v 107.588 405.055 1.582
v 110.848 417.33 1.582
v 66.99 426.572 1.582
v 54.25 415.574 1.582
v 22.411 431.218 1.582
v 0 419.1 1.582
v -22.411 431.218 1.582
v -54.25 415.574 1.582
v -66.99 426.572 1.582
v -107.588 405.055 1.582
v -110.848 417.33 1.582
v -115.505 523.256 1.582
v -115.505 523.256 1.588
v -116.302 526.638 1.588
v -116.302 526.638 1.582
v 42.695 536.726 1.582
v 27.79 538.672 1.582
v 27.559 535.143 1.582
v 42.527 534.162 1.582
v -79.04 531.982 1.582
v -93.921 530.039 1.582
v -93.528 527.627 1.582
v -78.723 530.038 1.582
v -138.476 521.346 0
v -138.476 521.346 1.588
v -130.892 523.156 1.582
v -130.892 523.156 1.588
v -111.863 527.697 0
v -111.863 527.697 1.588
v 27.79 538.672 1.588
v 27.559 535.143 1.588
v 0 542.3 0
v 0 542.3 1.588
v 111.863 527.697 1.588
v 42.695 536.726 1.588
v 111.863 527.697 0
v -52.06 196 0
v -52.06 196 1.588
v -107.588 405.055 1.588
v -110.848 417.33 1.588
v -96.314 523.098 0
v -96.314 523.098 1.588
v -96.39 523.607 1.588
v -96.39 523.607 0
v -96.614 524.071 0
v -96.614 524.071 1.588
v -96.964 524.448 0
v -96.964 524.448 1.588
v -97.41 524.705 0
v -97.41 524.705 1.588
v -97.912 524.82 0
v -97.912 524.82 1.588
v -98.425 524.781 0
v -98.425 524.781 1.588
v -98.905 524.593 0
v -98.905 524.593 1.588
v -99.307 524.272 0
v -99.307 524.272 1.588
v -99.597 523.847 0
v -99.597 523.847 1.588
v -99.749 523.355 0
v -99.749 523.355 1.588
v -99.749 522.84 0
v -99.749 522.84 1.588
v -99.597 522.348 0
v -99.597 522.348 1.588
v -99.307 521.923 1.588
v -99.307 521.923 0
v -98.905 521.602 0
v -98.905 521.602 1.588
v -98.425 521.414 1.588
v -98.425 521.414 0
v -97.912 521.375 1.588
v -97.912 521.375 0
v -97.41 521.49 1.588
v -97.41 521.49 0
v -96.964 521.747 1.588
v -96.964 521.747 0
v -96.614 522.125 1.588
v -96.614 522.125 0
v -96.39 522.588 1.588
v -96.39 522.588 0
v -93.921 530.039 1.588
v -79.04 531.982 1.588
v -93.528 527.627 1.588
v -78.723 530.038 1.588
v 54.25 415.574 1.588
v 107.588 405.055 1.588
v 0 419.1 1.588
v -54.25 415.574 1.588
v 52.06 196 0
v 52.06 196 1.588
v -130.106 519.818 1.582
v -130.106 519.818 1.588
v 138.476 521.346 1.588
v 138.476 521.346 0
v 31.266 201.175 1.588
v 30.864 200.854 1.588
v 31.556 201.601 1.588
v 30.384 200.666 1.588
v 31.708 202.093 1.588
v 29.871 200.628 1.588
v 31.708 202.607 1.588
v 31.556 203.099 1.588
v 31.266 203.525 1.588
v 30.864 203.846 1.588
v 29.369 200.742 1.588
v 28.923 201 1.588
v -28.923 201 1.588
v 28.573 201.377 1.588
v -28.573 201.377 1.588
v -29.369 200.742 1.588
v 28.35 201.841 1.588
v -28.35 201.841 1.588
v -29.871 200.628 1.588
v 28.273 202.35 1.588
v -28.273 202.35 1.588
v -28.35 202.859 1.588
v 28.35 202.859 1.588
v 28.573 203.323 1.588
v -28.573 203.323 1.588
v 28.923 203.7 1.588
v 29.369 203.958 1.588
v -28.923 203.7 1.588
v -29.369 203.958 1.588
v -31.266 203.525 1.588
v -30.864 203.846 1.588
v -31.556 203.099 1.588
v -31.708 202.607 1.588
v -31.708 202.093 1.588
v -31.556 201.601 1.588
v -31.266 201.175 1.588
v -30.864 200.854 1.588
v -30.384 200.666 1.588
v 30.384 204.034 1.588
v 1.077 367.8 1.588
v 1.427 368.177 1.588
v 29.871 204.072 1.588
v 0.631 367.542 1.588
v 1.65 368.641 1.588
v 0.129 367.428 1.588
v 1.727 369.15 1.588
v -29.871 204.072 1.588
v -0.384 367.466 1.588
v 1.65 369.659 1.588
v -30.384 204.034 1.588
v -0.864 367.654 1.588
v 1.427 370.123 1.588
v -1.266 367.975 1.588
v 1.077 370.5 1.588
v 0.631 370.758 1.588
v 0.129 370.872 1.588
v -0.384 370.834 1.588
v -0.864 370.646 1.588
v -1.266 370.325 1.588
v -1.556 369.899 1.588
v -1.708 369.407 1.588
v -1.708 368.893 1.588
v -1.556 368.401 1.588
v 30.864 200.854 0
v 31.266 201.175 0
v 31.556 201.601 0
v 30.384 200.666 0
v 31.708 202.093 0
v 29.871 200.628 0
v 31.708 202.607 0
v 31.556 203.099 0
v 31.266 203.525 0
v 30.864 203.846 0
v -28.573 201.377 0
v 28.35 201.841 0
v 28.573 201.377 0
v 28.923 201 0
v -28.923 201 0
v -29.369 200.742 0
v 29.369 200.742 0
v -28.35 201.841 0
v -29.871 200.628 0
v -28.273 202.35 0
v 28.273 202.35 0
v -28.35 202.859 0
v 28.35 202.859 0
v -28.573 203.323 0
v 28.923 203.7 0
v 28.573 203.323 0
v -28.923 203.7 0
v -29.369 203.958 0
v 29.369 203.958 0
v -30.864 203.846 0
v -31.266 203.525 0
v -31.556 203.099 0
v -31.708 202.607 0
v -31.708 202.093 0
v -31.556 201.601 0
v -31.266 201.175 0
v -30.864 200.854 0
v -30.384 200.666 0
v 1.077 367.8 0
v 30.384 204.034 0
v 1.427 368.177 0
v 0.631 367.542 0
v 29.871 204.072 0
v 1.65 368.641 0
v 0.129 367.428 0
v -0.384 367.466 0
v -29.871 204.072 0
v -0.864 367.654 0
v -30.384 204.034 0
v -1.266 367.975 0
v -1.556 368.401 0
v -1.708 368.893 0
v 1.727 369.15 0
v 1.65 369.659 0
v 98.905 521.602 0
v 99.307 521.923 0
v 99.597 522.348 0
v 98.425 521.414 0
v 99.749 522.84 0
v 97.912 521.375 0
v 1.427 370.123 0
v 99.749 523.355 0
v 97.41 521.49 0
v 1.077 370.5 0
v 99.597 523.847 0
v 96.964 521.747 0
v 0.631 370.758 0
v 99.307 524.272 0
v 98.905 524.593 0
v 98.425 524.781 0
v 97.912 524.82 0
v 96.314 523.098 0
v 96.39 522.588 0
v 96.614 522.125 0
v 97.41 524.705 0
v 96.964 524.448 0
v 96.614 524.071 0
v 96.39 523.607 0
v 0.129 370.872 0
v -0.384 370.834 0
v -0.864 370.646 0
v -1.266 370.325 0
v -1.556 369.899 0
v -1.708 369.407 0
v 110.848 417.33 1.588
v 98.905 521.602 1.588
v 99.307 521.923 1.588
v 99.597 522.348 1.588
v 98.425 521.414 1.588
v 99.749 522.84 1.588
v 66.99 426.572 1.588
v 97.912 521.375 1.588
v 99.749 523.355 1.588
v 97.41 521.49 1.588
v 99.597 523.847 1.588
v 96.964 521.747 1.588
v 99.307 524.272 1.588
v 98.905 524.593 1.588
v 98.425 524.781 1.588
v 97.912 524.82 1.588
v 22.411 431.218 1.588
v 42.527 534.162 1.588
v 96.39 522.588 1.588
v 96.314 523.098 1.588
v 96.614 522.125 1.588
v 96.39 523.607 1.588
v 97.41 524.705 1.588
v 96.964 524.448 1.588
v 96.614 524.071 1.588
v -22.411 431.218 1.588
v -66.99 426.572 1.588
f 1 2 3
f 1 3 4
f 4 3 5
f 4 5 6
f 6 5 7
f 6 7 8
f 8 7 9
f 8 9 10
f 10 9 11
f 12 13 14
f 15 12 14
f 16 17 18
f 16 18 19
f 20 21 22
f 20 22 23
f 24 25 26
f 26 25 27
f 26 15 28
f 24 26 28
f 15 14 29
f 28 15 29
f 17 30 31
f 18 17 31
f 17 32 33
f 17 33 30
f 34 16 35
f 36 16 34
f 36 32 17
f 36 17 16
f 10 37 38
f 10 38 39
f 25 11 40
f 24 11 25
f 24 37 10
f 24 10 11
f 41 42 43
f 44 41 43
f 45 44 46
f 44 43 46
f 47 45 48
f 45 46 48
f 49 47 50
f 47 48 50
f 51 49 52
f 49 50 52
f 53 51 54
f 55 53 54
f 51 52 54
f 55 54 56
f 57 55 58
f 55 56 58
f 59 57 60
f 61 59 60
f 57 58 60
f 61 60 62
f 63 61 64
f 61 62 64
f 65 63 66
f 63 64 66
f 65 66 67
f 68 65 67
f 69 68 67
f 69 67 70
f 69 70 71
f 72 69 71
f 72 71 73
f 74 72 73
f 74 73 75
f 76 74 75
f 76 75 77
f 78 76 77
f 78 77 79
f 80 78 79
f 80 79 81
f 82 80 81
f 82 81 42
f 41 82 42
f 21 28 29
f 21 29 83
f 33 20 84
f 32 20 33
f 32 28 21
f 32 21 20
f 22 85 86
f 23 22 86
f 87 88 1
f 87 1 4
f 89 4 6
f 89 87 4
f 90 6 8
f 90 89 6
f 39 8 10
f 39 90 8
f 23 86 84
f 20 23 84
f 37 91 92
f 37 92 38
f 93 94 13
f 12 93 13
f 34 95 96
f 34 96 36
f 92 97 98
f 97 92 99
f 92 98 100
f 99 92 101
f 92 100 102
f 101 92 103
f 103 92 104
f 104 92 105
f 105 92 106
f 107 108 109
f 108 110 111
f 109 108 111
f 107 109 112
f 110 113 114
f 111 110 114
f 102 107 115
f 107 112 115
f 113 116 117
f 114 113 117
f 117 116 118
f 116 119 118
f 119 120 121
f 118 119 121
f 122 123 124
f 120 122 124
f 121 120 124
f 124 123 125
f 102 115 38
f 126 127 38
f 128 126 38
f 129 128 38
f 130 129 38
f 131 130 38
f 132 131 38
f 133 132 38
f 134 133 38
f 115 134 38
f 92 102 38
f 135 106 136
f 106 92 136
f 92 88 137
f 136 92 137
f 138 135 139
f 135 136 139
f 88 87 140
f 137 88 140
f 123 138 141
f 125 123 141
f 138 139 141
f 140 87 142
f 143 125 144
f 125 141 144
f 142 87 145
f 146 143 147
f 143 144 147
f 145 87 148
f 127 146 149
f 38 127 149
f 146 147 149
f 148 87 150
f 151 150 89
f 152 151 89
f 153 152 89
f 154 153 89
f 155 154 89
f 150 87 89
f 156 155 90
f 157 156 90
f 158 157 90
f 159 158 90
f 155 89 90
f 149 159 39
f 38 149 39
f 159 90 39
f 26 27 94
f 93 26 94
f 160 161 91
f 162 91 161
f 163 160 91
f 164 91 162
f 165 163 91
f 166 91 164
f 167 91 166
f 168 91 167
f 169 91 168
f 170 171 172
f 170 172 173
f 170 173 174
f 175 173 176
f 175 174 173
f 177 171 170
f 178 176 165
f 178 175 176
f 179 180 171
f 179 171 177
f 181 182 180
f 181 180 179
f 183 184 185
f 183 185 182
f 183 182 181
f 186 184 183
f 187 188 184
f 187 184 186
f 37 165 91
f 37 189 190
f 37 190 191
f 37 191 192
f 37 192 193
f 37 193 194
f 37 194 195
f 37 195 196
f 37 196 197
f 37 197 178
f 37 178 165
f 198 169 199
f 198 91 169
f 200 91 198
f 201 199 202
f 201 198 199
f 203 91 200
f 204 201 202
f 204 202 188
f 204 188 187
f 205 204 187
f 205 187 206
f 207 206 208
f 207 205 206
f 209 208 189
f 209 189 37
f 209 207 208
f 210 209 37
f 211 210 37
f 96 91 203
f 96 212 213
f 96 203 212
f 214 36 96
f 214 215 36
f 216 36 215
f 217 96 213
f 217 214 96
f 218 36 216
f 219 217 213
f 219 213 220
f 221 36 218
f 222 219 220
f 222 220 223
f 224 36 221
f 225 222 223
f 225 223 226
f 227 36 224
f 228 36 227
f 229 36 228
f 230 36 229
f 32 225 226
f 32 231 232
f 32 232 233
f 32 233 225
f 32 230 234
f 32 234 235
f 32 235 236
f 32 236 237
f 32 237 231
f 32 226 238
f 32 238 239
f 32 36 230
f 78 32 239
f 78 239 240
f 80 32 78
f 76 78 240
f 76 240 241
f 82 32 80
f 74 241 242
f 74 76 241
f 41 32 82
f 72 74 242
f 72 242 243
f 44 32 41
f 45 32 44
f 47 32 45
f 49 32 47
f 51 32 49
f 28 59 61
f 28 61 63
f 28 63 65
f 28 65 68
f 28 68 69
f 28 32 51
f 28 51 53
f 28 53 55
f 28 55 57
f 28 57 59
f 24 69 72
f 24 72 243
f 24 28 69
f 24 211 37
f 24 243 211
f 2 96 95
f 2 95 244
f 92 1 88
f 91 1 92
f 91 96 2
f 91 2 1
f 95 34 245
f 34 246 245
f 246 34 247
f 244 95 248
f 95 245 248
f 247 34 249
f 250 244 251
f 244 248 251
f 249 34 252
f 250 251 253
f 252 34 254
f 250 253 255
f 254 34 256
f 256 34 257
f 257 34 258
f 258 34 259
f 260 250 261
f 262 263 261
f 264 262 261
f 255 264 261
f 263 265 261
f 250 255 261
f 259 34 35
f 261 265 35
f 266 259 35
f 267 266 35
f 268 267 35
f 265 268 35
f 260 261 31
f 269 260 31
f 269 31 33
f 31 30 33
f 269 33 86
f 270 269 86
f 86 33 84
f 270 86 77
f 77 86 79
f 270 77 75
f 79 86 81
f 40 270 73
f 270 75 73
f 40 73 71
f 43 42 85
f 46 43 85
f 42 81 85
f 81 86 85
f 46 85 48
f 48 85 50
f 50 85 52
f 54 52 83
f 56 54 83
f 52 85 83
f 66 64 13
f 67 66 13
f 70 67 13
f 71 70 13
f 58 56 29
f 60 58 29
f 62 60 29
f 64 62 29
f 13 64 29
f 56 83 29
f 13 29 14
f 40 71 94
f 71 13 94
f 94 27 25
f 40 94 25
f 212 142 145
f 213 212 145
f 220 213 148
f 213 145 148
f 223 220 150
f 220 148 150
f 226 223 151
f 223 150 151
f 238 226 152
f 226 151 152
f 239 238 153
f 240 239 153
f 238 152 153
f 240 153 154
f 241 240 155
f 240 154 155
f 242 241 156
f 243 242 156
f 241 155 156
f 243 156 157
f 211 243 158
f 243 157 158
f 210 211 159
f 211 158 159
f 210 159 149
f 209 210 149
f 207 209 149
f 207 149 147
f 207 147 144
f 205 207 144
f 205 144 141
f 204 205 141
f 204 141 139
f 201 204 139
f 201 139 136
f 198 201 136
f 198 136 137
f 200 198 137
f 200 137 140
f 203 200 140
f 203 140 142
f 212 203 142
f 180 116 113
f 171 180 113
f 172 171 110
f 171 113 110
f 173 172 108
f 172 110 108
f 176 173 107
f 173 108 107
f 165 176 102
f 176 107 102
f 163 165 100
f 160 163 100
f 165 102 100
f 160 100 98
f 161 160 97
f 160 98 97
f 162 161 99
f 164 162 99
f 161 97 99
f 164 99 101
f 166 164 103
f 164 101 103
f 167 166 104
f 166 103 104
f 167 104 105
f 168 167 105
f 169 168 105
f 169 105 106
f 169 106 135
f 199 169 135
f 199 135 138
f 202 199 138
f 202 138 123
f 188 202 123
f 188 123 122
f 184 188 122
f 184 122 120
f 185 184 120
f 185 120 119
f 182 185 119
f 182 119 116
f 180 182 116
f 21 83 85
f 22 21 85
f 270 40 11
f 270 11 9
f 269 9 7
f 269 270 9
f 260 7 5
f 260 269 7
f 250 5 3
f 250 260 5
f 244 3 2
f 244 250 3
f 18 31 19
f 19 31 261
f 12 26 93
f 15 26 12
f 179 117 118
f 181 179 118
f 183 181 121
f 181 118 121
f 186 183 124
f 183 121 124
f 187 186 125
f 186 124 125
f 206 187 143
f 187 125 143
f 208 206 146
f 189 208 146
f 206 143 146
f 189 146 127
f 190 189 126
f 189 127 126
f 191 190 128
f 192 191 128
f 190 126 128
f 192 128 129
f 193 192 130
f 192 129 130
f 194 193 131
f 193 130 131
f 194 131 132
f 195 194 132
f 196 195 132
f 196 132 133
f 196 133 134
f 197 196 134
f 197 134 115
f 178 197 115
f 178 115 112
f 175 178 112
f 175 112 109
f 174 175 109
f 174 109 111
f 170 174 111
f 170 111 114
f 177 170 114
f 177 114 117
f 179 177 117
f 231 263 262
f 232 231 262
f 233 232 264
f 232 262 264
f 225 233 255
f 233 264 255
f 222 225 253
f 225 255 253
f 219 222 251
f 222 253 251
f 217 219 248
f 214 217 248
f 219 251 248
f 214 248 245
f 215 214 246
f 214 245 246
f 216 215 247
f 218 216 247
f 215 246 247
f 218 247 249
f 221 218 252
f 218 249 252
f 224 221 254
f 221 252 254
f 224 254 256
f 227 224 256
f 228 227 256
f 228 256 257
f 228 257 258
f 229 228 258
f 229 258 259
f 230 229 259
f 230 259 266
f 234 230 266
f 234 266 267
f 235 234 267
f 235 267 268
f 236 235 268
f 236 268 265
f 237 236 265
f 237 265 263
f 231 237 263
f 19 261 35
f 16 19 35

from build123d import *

# Parameters (mm, degrees)
EXTRUDE1_DEPTH     = 1.5875
EXTRUDE3_DEPTH     = 2.5875
SKETCH3_R          = 1.7272
EXTRUDE2_DEPTH     = 2.5875
CUT_EXTRUDE1_DEPTH = 0.005


with BuildPart() as part:
    # Sketch1 → Extrude1 (new body)
    with BuildSketch(Plane(origin=(0, 0, 0), x_dir=(-1, 0, 0), z_dir=(0, 0, -1))):
        Polygon((-139.214433641, 524.126541463), (-52.060002376, 196), (52.060002376, 196), (139.214433641, 524.126541463), (0, 542.3), align=None)
    extrude(amount=-EXTRUDE1_DEPTH)

    # Sketch5 → Extrude3 (cut, through all)
    with BuildSketch(Plane.XY.offset(1.5875)):
        Polygon((-138.475953663, 521.346248167), (-111.862580021, 527.697132275), (-139.214433641, 524.126541463), align=None)
        Polygon((139.214433641, 524.126541463), (138.475953663, 521.346248167), (111.862580021, 527.697132275), align=None)
    extrude(amount=-EXTRUDE3_DEPTH, mode=Mode.SUBTRACT)

    # Sketch3 → Extrude2 (cut, through all)
    with BuildSketch(Plane.XY.offset(1.5875)):
        with Locations((-98.040924265, 523.097573518)):
            Circle(SKETCH3_R)
        with Locations((-30, 202.35)):
            Circle(SKETCH3_R)
        with Locations(Location((30, 202.35, 0), (0, 0, 180))):  # turned: the seam where the file's is
            Circle(SKETCH3_R)
        with Locations(Location((98.040924265, 523.097573518, 0), (0, 0, 180))):  # turned: the seam where the file's is
            Circle(SKETCH3_R)
        with Locations((0, 369.15)):
            Circle(SKETCH3_R)
    extrude(amount=-EXTRUDE2_DEPTH, mode=Mode.SUBTRACT)

    # Sketch4 → Cut-Extrude1 (cut)
    with BuildSketch(Plane.XY.offset(1.5875)):
        with BuildLine():
            Line((110.847856253, 417.329597278), (107.587625187, 405.055197358))
            ThreePointArc((107.587625187, 405.055197358), (0, 419.1), (-107.587625187, 405.055197358))
            Line((-107.587625187, 405.055197358), (-110.847856253, 417.329597278))
            ThreePointArc((-110.847856253, 417.329597278), (0, 431.8), (110.847856253, 417.329597278))
        make_face()
        Polygon((-93.921186267, 530.039254187), (-93.5283394, 527.627083961), (-78.723393901, 530.038222445), (-79.039941137, 531.981895365), align=None)
        Polygon((27.790346618, 538.672167032), (27.559054717, 535.14333454), (42.526938566, 534.162287602), (42.695003931, 536.726469559), align=None)
        Polygon((-131.361910987, 525.151632692), (-130.105913895, 519.817603751), (-115.505225018, 523.255609615), (-116.411244397, 527.10333635), align=None)
    extrude(amount=-CUT_EXTRUDE1_DEPTH, mode=Mode.SUBTRACT)


solid = part.part
